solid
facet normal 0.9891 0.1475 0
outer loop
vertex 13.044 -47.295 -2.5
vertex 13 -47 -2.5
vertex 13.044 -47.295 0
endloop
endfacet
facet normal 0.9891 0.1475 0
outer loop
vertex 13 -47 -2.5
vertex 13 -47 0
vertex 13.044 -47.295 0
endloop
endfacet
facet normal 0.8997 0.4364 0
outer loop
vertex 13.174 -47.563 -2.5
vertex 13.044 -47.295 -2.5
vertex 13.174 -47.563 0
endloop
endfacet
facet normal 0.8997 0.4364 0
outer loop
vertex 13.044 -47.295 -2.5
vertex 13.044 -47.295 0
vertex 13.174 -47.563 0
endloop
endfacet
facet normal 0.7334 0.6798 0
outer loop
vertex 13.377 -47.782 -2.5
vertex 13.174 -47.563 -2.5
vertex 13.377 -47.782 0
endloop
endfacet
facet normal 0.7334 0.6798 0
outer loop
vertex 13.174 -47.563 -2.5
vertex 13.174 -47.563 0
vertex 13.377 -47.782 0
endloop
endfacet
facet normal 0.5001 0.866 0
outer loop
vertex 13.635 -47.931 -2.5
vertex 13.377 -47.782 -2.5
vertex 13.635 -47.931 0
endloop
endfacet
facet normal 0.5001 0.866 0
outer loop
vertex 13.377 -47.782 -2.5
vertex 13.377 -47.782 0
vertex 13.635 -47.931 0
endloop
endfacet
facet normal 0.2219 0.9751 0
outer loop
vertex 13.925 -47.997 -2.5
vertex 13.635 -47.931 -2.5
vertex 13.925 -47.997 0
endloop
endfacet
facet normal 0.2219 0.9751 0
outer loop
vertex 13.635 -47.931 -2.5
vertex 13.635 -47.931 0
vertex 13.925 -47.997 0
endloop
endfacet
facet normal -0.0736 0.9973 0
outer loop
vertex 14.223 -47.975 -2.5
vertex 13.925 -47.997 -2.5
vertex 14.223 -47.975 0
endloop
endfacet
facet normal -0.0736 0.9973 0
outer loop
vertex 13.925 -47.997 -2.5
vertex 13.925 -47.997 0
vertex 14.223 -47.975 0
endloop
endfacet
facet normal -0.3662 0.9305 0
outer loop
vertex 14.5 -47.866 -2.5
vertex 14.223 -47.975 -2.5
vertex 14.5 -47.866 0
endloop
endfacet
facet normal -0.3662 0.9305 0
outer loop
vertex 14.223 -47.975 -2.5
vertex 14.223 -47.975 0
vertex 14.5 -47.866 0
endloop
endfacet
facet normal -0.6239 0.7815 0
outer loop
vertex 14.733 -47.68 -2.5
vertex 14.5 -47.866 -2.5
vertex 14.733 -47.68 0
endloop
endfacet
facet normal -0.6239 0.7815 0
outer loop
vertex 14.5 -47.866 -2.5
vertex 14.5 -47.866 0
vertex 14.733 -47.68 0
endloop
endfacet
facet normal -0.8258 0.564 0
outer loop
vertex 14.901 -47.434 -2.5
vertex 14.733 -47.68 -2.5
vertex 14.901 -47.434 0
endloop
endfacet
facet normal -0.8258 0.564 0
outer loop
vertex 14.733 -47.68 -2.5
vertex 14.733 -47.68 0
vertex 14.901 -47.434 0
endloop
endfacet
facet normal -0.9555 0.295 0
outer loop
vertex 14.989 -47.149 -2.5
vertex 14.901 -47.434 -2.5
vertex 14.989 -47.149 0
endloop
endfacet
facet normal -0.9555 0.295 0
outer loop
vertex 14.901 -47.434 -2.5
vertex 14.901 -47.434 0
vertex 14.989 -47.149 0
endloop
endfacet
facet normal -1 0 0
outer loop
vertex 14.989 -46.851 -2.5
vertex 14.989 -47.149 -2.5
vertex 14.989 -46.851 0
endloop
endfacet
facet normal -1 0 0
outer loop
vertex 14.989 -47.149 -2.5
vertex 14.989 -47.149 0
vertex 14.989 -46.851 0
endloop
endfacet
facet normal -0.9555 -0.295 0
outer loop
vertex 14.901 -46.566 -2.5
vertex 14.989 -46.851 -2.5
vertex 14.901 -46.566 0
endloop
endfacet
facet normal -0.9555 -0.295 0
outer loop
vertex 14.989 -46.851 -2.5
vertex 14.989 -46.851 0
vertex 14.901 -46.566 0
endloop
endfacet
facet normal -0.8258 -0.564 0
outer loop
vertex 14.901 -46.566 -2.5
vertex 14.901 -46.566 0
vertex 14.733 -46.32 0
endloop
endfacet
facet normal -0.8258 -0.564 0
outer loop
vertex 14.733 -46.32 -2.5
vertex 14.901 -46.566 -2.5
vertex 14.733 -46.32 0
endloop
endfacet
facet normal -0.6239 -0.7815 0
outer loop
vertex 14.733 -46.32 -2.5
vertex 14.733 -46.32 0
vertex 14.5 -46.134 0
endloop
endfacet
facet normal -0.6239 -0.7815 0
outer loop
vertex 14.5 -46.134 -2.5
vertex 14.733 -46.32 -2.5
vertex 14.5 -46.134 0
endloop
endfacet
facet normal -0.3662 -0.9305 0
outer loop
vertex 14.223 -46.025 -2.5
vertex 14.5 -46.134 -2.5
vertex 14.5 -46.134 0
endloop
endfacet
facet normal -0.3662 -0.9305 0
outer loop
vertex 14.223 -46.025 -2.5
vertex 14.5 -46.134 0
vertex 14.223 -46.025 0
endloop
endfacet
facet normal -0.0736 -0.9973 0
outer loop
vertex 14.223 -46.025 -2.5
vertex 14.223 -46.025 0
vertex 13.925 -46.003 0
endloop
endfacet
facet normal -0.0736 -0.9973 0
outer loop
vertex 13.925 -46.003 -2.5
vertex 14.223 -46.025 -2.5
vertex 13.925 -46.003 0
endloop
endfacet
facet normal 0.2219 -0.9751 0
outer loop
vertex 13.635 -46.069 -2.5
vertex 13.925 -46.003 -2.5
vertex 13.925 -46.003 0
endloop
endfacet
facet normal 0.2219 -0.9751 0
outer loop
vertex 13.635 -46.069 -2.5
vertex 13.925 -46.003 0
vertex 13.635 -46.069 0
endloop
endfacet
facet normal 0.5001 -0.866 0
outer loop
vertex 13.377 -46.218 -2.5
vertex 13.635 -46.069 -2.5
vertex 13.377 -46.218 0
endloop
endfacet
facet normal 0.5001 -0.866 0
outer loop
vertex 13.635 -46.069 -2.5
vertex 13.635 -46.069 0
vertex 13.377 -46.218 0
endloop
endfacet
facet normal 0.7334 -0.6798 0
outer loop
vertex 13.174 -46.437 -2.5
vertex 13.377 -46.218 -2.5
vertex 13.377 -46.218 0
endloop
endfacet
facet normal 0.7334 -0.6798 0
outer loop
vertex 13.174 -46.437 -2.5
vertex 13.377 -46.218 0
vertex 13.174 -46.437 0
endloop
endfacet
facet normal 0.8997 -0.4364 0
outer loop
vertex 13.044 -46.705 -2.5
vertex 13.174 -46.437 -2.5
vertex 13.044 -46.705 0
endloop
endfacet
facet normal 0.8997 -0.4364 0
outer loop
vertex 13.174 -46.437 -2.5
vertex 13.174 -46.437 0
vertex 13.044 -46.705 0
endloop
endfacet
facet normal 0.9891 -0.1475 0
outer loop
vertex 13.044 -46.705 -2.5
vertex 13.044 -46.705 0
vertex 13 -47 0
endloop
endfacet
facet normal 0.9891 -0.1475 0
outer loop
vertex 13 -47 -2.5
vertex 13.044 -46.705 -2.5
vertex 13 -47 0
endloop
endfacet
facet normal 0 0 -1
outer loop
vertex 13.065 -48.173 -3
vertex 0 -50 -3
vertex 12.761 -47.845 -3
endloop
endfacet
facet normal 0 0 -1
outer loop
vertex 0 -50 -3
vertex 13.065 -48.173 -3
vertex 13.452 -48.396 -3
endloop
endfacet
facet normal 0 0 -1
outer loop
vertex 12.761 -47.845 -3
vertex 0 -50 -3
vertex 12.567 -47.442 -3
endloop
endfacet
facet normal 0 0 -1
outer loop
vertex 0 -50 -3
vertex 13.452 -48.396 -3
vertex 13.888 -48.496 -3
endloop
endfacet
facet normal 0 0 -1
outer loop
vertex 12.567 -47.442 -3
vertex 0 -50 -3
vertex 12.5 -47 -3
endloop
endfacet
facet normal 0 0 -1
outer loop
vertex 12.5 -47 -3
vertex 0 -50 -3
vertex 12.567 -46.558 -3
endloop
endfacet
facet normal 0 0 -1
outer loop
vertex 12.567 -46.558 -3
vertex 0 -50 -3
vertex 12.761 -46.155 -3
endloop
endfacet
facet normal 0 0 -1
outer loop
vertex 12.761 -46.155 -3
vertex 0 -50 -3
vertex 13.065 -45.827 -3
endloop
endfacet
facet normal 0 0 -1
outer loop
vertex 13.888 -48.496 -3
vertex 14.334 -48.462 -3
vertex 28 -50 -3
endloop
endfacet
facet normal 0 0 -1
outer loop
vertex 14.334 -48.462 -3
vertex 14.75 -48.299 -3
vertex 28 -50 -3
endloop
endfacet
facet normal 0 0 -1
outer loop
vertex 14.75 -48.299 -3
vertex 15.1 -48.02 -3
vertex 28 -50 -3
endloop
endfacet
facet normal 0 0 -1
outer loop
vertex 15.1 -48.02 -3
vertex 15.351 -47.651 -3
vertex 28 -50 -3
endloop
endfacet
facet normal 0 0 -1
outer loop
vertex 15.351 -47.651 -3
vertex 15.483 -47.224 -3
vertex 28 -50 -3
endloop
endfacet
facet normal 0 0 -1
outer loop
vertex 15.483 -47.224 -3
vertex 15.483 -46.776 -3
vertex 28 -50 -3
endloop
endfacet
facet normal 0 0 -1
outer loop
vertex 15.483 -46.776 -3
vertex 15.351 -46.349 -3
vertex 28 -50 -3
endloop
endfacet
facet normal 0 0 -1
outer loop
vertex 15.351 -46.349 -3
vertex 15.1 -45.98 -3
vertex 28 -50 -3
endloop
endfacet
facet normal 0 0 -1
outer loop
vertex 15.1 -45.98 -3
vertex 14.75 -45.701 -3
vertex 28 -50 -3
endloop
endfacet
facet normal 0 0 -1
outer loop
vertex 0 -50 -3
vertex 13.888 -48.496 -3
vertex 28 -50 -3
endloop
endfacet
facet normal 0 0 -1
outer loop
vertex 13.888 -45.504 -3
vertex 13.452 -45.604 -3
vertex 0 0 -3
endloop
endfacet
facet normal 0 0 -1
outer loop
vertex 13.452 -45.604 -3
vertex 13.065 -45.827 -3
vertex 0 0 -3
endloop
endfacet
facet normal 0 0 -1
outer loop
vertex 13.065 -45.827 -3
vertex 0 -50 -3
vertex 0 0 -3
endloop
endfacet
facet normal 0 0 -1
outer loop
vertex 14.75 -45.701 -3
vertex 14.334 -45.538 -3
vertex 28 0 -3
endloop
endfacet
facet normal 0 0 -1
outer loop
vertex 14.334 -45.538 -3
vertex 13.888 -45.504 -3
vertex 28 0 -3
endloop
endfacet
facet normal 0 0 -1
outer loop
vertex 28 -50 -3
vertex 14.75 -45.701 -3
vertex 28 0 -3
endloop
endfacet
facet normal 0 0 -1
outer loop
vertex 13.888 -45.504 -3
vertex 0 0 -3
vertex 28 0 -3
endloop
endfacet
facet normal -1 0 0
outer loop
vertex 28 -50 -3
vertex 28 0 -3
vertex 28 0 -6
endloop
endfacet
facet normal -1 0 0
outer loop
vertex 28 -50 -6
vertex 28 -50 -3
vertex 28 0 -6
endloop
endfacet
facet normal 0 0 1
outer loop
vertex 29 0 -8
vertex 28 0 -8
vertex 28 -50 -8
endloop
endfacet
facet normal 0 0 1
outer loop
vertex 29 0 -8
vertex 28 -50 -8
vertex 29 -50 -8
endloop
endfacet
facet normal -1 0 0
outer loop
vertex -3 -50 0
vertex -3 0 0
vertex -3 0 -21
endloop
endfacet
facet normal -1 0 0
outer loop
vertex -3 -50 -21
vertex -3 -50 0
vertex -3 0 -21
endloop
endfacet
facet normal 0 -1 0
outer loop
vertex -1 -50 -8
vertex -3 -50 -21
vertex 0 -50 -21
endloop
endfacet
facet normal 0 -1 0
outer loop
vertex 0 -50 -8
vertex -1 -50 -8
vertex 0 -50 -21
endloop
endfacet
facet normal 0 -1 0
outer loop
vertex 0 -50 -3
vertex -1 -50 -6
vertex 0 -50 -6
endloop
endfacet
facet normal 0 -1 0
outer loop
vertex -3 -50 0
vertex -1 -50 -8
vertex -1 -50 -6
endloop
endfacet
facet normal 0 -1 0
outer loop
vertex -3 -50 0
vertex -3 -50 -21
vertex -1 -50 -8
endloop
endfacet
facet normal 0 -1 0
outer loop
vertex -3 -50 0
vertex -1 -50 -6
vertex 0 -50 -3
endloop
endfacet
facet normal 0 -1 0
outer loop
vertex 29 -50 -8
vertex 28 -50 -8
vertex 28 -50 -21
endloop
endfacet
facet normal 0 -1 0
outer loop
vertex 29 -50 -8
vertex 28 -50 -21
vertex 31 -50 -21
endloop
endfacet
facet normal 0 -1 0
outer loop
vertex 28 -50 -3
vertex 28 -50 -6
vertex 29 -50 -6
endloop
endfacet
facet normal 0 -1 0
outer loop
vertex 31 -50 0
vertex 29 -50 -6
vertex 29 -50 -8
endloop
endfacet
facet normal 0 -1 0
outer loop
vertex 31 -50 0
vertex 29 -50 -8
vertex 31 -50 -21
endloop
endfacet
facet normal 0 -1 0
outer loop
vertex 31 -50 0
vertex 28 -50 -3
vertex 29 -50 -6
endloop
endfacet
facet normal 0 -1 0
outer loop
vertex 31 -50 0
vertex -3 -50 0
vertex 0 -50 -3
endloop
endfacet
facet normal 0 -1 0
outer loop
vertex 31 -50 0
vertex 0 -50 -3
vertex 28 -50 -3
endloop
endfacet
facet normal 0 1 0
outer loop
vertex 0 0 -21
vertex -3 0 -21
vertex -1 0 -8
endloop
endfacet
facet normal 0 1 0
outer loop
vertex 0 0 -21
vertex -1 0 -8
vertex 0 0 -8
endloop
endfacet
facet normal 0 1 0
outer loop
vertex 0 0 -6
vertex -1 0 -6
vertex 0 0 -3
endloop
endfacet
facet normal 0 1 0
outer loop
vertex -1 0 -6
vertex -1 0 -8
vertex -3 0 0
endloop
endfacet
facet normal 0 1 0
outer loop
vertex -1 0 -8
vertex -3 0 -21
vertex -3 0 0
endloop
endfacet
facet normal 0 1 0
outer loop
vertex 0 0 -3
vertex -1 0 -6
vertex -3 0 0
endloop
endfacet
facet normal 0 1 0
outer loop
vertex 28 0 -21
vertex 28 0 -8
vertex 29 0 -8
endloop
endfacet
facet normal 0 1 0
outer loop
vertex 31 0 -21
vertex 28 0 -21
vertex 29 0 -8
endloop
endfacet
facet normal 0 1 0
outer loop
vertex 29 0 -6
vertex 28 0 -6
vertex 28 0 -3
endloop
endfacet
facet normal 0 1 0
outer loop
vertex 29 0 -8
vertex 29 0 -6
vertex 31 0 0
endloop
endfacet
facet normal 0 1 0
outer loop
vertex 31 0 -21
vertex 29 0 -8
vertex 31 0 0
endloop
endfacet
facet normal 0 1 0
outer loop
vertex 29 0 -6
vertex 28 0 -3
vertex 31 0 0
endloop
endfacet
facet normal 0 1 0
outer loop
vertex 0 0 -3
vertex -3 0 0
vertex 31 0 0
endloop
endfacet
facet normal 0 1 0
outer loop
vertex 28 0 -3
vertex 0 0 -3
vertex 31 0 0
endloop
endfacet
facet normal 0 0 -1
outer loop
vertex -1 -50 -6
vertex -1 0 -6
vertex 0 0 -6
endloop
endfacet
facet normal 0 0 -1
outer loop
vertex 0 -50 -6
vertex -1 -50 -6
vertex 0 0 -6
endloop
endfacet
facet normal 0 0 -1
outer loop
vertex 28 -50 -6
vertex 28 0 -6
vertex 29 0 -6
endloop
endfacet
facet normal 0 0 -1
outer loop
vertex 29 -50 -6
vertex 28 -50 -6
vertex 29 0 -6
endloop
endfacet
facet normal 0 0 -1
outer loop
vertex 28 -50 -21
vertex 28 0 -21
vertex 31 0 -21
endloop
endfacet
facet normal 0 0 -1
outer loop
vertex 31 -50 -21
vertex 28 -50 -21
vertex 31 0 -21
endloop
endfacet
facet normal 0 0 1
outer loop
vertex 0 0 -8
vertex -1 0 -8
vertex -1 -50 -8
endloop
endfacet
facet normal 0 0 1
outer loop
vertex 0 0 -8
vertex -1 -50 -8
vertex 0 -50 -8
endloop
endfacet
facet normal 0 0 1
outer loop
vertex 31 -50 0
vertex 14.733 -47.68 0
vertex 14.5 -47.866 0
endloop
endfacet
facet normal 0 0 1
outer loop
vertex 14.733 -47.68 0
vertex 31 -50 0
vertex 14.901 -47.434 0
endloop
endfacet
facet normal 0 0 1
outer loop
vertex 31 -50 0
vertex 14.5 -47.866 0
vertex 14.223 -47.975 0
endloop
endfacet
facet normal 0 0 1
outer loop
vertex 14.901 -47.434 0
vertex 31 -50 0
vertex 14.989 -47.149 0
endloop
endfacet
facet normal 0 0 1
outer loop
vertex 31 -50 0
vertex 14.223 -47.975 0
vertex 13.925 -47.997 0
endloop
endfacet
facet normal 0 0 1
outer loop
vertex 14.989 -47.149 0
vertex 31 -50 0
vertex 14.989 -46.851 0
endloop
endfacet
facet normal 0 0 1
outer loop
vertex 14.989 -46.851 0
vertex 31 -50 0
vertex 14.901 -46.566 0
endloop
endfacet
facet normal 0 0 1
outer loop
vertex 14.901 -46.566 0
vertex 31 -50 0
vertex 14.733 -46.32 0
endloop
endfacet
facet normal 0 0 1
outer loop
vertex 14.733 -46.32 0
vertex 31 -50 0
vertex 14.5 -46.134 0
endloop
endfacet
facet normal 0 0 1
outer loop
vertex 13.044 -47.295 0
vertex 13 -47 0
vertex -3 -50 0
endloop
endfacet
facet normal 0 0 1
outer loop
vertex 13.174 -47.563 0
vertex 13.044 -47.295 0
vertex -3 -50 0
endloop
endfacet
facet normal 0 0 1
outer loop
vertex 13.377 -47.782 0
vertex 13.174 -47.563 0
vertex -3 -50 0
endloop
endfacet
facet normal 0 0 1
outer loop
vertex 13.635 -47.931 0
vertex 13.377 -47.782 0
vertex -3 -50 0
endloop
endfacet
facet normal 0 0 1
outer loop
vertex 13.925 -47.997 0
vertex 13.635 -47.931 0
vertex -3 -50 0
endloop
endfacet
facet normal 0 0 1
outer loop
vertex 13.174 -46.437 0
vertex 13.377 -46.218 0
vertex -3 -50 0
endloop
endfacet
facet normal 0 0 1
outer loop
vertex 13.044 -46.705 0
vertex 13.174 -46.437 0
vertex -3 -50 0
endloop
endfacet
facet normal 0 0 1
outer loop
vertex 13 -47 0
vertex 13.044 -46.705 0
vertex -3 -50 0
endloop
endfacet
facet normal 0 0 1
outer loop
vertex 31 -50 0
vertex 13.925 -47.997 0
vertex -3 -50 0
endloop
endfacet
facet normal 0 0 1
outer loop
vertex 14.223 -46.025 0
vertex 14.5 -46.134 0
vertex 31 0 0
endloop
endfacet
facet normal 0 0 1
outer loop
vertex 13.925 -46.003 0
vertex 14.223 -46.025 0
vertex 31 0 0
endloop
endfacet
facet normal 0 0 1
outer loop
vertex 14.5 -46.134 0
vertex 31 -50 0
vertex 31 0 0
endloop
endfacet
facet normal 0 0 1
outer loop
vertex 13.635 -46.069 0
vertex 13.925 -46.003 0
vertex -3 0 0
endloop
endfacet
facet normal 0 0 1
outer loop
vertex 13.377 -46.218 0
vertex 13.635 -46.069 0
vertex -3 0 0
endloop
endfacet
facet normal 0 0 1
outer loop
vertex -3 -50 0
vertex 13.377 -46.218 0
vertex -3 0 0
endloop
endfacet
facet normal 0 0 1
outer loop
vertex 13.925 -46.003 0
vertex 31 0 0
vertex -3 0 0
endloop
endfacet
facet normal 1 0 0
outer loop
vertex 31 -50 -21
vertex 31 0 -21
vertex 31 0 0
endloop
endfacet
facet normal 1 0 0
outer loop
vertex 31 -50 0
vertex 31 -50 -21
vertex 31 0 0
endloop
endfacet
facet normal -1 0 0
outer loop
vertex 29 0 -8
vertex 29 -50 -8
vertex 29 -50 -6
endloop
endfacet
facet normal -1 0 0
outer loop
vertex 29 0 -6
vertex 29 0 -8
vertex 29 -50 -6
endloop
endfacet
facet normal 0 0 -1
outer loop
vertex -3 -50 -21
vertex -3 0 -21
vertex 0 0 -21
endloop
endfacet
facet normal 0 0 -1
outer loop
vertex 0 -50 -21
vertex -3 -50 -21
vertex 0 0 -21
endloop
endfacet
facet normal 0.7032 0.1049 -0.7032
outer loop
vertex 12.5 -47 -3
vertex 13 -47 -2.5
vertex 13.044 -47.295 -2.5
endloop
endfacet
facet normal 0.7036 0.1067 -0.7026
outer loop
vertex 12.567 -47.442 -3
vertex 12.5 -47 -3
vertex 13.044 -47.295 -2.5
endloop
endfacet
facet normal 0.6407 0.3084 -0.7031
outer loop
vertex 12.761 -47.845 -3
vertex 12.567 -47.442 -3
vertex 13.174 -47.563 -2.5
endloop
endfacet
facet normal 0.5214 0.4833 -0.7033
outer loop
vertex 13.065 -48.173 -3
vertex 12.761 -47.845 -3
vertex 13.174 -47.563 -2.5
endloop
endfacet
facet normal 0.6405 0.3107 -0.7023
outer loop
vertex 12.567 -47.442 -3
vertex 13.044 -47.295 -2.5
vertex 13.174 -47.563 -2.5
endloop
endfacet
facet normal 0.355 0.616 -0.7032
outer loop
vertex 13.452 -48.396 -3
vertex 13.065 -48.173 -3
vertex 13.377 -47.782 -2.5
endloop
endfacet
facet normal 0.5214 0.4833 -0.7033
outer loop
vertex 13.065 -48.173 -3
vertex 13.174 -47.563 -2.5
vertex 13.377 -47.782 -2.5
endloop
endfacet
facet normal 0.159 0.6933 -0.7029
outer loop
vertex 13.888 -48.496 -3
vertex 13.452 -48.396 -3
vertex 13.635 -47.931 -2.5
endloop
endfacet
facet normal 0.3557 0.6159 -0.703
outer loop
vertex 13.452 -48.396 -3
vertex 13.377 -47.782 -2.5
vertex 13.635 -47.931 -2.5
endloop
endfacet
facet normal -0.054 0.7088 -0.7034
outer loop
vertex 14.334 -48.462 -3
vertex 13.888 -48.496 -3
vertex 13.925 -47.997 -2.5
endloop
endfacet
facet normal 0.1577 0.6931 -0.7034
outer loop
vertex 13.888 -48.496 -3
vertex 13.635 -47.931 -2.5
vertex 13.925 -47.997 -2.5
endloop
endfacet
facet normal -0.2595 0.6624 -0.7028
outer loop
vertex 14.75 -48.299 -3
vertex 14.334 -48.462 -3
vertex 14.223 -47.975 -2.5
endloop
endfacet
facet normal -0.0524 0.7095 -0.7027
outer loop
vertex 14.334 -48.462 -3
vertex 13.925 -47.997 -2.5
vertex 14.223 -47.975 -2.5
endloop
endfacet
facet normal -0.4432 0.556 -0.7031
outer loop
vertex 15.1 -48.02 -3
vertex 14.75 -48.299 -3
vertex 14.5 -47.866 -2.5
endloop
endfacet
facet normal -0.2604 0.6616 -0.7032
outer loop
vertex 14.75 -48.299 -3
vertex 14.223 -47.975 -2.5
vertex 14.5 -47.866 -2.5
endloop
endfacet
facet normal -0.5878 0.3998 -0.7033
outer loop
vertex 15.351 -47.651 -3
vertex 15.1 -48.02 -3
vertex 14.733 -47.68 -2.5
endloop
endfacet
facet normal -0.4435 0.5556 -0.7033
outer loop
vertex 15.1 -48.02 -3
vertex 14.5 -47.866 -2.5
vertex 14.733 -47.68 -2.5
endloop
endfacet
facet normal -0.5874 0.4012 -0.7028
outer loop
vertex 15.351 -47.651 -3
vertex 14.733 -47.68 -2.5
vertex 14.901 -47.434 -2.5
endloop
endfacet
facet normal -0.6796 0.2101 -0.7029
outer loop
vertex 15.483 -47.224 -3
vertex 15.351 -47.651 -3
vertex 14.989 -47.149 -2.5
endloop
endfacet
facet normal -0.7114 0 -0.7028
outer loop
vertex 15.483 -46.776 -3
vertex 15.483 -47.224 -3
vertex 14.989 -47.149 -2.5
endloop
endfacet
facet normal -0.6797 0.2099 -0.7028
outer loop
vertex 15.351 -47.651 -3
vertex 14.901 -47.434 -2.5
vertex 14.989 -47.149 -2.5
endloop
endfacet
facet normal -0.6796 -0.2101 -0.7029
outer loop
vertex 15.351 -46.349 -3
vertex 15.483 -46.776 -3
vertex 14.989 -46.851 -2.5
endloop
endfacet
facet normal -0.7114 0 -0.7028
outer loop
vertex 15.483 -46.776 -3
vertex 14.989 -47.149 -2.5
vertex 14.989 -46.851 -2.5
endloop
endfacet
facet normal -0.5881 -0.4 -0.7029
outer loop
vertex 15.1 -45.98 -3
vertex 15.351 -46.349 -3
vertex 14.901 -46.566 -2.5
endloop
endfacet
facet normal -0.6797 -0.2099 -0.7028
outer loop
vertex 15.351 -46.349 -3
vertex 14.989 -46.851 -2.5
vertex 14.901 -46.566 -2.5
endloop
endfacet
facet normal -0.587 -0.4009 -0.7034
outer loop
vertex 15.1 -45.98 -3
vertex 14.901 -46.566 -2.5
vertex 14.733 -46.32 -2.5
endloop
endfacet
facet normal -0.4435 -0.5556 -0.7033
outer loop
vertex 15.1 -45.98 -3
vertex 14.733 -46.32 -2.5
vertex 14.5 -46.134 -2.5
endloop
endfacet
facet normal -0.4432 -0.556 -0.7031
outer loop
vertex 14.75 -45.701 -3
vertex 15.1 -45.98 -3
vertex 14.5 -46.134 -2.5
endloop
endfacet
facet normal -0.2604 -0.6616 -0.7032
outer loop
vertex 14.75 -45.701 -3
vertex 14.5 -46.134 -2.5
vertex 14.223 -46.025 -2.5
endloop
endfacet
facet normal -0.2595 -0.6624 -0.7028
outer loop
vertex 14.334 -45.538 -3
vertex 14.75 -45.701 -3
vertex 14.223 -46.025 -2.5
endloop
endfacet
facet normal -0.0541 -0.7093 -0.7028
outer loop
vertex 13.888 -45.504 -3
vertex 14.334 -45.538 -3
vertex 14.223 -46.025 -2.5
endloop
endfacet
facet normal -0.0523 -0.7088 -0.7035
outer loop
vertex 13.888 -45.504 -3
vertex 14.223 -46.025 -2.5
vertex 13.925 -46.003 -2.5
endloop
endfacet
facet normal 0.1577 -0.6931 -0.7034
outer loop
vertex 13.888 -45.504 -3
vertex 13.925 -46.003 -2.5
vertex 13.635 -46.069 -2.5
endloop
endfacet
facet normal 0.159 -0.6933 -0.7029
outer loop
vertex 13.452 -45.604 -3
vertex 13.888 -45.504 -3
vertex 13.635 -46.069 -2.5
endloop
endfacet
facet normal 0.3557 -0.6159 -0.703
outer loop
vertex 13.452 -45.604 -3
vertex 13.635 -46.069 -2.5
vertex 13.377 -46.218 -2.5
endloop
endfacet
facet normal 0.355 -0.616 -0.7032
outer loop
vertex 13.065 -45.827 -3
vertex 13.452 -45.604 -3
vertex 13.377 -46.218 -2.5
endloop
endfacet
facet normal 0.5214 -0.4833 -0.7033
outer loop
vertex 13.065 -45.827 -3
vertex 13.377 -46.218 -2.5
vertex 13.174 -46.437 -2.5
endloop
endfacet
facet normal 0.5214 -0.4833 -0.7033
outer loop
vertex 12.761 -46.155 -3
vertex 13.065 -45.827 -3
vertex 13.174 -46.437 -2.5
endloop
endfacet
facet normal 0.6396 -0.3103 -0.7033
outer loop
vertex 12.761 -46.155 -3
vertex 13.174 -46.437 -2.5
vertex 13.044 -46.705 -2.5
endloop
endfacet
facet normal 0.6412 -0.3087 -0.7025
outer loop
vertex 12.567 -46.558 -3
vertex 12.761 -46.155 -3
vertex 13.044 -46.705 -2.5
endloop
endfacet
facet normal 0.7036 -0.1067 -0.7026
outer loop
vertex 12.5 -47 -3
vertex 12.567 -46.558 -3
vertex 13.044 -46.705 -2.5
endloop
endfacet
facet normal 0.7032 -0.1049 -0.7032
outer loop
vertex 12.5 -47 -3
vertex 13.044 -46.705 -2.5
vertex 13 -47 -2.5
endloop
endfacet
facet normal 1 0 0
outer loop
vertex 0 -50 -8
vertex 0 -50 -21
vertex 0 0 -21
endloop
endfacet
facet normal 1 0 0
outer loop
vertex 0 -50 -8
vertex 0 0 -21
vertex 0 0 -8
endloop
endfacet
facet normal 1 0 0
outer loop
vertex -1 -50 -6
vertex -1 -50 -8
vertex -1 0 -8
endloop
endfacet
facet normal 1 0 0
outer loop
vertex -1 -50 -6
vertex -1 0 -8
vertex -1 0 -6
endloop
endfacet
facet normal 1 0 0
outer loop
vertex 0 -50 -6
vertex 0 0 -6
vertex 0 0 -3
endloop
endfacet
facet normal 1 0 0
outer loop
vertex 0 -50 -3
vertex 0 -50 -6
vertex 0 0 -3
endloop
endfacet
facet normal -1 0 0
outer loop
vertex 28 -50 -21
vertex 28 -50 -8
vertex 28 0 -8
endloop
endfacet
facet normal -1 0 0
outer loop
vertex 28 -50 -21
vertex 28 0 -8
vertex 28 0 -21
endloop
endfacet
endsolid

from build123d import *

# Parameters (mm, degrees)
F0_W           = 28
F0_H           = 3
F1_DEPTH       = 50
F2_W           = 1
F2_H           = 2
F3_DEPTH       = 50
F5_D           = 2
F5_CSINK_D     = 3
F5_CSINK_ANGLE = 90


with BuildPart() as f1:
    # F0 (on Front) → F1 (new body)
    with BuildSketch(Plane.XZ):
        Polygon((0, -3), (0, 0), (-3, 0), (-3, -21), (0, -21), align=None)
        with Locations((14, -1.5)):
            Rectangle(F0_W, F0_H)
        Polygon((31, 0), (28, 0), (28, -3), (28, -21), (31, -21), align=None)
    extrude(amount=F1_DEPTH)

    # F2 (on face) → F3 (cut)
    with BuildSketch(Plane.XZ.offset(50)):
        with Locations((-0.5, -7)):
            Rectangle(F2_W, F2_H)
        with Locations((28.5, -7)):
            Rectangle(F2_W, F2_H)
    extrude(amount=-F3_DEPTH, mode=Mode.SUBTRACT)

    # F5 (through all)
    with Locations(Plane(origin=(0, 0, -3), x_dir=(1, 0, 0), z_dir=(0, 0, -1))):
        with Locations((14, 47)):
            CounterSinkHole(F5_D / 2, F5_CSINK_D / 2, counter_sink_angle=F5_CSINK_ANGLE)


solid = f1.part
